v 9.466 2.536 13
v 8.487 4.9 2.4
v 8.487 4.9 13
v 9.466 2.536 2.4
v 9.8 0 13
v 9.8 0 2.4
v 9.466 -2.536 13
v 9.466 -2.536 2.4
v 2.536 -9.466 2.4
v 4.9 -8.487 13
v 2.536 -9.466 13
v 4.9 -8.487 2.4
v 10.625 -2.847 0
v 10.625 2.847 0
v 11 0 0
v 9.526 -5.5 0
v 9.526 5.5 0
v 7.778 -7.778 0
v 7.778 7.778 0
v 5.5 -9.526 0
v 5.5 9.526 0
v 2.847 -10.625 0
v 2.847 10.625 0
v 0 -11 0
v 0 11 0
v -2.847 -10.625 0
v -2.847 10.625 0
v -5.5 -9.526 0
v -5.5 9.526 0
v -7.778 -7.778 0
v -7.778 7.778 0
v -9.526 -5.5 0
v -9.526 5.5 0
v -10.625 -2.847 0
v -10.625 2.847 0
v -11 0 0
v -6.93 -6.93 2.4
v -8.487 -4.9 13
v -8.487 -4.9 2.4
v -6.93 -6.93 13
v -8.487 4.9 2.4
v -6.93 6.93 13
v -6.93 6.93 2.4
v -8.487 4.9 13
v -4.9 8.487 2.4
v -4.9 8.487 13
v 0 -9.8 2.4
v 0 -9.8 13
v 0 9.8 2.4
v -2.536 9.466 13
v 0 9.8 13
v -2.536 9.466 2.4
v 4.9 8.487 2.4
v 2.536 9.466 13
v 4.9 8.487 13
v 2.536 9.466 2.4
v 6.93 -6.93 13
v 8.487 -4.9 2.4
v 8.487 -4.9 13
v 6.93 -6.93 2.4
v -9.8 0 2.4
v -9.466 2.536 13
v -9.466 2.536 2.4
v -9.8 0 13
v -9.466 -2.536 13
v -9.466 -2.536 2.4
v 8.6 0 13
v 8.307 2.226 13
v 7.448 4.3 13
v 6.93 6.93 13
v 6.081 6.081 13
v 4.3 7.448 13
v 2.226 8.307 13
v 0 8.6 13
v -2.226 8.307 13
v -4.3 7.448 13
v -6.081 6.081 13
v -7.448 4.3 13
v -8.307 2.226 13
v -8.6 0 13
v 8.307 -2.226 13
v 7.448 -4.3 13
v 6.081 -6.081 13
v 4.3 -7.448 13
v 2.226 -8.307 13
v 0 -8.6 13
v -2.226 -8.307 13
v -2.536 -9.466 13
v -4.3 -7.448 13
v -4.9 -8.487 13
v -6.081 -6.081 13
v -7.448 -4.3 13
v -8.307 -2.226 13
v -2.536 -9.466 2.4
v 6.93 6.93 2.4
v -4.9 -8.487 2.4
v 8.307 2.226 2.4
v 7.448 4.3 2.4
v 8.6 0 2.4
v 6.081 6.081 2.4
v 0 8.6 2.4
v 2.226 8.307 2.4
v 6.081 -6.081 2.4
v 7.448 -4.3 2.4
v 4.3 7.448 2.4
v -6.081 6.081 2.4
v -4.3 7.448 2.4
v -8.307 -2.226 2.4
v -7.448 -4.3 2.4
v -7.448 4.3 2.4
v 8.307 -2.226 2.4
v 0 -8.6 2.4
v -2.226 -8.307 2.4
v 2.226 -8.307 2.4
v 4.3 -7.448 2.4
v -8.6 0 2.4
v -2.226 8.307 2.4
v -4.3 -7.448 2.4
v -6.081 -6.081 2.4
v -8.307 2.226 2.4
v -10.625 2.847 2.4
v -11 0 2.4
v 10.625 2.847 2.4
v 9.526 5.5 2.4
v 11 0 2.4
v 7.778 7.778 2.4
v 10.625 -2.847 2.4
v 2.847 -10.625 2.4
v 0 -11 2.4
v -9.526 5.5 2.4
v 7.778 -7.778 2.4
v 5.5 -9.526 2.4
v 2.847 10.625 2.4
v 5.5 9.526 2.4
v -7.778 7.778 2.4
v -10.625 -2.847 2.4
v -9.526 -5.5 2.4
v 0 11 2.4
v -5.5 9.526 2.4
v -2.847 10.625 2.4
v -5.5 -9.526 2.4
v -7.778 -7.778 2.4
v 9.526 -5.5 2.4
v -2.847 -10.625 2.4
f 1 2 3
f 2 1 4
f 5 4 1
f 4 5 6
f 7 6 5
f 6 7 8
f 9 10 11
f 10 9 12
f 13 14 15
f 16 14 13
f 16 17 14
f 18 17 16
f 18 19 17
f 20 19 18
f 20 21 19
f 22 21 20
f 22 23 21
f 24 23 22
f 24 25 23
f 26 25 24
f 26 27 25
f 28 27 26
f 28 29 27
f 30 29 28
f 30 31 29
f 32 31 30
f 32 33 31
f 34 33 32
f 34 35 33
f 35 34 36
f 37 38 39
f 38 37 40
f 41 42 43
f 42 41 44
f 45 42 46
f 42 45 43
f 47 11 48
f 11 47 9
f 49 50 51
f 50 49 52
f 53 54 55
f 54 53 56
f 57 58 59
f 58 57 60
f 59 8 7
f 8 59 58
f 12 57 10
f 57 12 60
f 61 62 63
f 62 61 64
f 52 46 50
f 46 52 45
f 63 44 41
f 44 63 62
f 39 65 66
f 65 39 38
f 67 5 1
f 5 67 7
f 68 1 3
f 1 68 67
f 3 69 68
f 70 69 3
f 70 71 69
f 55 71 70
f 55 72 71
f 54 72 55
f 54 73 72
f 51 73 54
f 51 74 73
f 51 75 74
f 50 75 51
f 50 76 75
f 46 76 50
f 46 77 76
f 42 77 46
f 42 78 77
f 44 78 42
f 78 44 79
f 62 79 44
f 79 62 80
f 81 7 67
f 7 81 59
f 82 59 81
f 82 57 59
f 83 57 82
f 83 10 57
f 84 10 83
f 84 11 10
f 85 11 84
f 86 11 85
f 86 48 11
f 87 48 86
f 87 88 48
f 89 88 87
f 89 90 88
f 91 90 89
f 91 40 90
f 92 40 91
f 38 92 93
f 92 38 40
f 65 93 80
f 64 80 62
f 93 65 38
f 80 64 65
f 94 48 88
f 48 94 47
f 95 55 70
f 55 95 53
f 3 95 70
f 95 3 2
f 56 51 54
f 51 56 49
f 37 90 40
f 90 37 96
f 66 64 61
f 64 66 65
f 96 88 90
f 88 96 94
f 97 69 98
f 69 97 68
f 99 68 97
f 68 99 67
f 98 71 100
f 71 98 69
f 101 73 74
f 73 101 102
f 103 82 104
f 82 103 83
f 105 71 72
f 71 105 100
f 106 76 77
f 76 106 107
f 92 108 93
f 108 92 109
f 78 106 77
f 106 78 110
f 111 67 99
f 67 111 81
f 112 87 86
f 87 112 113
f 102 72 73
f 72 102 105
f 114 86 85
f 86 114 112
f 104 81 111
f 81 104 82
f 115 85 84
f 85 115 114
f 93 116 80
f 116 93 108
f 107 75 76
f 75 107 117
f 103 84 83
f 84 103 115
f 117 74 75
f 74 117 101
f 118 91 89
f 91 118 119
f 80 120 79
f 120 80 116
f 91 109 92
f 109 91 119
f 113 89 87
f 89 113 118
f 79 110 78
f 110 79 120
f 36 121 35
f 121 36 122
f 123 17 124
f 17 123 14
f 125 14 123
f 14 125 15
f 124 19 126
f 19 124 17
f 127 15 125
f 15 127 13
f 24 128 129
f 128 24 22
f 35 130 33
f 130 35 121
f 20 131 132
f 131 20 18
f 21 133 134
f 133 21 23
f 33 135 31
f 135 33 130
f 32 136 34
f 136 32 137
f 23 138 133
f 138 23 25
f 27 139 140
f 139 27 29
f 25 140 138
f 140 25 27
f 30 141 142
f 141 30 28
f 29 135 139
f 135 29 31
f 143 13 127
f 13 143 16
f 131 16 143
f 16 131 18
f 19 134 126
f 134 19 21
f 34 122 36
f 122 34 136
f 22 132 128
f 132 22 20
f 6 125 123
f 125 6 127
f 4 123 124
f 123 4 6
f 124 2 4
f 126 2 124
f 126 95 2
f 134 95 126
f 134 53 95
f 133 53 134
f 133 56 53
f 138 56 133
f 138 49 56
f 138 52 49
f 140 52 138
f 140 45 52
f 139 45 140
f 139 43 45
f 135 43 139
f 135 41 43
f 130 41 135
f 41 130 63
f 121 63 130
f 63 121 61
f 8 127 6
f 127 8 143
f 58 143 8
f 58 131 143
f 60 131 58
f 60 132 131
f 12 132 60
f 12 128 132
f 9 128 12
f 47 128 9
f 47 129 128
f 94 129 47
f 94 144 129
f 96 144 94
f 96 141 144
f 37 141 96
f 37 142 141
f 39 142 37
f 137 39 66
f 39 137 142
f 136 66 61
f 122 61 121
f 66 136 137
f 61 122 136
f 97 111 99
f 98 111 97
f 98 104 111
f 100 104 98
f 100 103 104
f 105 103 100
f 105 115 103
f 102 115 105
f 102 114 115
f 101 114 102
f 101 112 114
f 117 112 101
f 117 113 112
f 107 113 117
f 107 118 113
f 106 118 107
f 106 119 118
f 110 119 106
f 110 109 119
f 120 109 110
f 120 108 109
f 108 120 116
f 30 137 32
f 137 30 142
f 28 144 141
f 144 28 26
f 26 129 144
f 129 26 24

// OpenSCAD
diameter=19.60;
height=13;
thickness=1.2;
$fn=24;

cylinder(d=diameter+2*thickness, h=2*thickness);
difference() {
  cylinder(d=diameter,h=height);
  translate([0,0,0.01]) {
    cylinder(d=diameter-2*thickness,h=height);
  }
}
